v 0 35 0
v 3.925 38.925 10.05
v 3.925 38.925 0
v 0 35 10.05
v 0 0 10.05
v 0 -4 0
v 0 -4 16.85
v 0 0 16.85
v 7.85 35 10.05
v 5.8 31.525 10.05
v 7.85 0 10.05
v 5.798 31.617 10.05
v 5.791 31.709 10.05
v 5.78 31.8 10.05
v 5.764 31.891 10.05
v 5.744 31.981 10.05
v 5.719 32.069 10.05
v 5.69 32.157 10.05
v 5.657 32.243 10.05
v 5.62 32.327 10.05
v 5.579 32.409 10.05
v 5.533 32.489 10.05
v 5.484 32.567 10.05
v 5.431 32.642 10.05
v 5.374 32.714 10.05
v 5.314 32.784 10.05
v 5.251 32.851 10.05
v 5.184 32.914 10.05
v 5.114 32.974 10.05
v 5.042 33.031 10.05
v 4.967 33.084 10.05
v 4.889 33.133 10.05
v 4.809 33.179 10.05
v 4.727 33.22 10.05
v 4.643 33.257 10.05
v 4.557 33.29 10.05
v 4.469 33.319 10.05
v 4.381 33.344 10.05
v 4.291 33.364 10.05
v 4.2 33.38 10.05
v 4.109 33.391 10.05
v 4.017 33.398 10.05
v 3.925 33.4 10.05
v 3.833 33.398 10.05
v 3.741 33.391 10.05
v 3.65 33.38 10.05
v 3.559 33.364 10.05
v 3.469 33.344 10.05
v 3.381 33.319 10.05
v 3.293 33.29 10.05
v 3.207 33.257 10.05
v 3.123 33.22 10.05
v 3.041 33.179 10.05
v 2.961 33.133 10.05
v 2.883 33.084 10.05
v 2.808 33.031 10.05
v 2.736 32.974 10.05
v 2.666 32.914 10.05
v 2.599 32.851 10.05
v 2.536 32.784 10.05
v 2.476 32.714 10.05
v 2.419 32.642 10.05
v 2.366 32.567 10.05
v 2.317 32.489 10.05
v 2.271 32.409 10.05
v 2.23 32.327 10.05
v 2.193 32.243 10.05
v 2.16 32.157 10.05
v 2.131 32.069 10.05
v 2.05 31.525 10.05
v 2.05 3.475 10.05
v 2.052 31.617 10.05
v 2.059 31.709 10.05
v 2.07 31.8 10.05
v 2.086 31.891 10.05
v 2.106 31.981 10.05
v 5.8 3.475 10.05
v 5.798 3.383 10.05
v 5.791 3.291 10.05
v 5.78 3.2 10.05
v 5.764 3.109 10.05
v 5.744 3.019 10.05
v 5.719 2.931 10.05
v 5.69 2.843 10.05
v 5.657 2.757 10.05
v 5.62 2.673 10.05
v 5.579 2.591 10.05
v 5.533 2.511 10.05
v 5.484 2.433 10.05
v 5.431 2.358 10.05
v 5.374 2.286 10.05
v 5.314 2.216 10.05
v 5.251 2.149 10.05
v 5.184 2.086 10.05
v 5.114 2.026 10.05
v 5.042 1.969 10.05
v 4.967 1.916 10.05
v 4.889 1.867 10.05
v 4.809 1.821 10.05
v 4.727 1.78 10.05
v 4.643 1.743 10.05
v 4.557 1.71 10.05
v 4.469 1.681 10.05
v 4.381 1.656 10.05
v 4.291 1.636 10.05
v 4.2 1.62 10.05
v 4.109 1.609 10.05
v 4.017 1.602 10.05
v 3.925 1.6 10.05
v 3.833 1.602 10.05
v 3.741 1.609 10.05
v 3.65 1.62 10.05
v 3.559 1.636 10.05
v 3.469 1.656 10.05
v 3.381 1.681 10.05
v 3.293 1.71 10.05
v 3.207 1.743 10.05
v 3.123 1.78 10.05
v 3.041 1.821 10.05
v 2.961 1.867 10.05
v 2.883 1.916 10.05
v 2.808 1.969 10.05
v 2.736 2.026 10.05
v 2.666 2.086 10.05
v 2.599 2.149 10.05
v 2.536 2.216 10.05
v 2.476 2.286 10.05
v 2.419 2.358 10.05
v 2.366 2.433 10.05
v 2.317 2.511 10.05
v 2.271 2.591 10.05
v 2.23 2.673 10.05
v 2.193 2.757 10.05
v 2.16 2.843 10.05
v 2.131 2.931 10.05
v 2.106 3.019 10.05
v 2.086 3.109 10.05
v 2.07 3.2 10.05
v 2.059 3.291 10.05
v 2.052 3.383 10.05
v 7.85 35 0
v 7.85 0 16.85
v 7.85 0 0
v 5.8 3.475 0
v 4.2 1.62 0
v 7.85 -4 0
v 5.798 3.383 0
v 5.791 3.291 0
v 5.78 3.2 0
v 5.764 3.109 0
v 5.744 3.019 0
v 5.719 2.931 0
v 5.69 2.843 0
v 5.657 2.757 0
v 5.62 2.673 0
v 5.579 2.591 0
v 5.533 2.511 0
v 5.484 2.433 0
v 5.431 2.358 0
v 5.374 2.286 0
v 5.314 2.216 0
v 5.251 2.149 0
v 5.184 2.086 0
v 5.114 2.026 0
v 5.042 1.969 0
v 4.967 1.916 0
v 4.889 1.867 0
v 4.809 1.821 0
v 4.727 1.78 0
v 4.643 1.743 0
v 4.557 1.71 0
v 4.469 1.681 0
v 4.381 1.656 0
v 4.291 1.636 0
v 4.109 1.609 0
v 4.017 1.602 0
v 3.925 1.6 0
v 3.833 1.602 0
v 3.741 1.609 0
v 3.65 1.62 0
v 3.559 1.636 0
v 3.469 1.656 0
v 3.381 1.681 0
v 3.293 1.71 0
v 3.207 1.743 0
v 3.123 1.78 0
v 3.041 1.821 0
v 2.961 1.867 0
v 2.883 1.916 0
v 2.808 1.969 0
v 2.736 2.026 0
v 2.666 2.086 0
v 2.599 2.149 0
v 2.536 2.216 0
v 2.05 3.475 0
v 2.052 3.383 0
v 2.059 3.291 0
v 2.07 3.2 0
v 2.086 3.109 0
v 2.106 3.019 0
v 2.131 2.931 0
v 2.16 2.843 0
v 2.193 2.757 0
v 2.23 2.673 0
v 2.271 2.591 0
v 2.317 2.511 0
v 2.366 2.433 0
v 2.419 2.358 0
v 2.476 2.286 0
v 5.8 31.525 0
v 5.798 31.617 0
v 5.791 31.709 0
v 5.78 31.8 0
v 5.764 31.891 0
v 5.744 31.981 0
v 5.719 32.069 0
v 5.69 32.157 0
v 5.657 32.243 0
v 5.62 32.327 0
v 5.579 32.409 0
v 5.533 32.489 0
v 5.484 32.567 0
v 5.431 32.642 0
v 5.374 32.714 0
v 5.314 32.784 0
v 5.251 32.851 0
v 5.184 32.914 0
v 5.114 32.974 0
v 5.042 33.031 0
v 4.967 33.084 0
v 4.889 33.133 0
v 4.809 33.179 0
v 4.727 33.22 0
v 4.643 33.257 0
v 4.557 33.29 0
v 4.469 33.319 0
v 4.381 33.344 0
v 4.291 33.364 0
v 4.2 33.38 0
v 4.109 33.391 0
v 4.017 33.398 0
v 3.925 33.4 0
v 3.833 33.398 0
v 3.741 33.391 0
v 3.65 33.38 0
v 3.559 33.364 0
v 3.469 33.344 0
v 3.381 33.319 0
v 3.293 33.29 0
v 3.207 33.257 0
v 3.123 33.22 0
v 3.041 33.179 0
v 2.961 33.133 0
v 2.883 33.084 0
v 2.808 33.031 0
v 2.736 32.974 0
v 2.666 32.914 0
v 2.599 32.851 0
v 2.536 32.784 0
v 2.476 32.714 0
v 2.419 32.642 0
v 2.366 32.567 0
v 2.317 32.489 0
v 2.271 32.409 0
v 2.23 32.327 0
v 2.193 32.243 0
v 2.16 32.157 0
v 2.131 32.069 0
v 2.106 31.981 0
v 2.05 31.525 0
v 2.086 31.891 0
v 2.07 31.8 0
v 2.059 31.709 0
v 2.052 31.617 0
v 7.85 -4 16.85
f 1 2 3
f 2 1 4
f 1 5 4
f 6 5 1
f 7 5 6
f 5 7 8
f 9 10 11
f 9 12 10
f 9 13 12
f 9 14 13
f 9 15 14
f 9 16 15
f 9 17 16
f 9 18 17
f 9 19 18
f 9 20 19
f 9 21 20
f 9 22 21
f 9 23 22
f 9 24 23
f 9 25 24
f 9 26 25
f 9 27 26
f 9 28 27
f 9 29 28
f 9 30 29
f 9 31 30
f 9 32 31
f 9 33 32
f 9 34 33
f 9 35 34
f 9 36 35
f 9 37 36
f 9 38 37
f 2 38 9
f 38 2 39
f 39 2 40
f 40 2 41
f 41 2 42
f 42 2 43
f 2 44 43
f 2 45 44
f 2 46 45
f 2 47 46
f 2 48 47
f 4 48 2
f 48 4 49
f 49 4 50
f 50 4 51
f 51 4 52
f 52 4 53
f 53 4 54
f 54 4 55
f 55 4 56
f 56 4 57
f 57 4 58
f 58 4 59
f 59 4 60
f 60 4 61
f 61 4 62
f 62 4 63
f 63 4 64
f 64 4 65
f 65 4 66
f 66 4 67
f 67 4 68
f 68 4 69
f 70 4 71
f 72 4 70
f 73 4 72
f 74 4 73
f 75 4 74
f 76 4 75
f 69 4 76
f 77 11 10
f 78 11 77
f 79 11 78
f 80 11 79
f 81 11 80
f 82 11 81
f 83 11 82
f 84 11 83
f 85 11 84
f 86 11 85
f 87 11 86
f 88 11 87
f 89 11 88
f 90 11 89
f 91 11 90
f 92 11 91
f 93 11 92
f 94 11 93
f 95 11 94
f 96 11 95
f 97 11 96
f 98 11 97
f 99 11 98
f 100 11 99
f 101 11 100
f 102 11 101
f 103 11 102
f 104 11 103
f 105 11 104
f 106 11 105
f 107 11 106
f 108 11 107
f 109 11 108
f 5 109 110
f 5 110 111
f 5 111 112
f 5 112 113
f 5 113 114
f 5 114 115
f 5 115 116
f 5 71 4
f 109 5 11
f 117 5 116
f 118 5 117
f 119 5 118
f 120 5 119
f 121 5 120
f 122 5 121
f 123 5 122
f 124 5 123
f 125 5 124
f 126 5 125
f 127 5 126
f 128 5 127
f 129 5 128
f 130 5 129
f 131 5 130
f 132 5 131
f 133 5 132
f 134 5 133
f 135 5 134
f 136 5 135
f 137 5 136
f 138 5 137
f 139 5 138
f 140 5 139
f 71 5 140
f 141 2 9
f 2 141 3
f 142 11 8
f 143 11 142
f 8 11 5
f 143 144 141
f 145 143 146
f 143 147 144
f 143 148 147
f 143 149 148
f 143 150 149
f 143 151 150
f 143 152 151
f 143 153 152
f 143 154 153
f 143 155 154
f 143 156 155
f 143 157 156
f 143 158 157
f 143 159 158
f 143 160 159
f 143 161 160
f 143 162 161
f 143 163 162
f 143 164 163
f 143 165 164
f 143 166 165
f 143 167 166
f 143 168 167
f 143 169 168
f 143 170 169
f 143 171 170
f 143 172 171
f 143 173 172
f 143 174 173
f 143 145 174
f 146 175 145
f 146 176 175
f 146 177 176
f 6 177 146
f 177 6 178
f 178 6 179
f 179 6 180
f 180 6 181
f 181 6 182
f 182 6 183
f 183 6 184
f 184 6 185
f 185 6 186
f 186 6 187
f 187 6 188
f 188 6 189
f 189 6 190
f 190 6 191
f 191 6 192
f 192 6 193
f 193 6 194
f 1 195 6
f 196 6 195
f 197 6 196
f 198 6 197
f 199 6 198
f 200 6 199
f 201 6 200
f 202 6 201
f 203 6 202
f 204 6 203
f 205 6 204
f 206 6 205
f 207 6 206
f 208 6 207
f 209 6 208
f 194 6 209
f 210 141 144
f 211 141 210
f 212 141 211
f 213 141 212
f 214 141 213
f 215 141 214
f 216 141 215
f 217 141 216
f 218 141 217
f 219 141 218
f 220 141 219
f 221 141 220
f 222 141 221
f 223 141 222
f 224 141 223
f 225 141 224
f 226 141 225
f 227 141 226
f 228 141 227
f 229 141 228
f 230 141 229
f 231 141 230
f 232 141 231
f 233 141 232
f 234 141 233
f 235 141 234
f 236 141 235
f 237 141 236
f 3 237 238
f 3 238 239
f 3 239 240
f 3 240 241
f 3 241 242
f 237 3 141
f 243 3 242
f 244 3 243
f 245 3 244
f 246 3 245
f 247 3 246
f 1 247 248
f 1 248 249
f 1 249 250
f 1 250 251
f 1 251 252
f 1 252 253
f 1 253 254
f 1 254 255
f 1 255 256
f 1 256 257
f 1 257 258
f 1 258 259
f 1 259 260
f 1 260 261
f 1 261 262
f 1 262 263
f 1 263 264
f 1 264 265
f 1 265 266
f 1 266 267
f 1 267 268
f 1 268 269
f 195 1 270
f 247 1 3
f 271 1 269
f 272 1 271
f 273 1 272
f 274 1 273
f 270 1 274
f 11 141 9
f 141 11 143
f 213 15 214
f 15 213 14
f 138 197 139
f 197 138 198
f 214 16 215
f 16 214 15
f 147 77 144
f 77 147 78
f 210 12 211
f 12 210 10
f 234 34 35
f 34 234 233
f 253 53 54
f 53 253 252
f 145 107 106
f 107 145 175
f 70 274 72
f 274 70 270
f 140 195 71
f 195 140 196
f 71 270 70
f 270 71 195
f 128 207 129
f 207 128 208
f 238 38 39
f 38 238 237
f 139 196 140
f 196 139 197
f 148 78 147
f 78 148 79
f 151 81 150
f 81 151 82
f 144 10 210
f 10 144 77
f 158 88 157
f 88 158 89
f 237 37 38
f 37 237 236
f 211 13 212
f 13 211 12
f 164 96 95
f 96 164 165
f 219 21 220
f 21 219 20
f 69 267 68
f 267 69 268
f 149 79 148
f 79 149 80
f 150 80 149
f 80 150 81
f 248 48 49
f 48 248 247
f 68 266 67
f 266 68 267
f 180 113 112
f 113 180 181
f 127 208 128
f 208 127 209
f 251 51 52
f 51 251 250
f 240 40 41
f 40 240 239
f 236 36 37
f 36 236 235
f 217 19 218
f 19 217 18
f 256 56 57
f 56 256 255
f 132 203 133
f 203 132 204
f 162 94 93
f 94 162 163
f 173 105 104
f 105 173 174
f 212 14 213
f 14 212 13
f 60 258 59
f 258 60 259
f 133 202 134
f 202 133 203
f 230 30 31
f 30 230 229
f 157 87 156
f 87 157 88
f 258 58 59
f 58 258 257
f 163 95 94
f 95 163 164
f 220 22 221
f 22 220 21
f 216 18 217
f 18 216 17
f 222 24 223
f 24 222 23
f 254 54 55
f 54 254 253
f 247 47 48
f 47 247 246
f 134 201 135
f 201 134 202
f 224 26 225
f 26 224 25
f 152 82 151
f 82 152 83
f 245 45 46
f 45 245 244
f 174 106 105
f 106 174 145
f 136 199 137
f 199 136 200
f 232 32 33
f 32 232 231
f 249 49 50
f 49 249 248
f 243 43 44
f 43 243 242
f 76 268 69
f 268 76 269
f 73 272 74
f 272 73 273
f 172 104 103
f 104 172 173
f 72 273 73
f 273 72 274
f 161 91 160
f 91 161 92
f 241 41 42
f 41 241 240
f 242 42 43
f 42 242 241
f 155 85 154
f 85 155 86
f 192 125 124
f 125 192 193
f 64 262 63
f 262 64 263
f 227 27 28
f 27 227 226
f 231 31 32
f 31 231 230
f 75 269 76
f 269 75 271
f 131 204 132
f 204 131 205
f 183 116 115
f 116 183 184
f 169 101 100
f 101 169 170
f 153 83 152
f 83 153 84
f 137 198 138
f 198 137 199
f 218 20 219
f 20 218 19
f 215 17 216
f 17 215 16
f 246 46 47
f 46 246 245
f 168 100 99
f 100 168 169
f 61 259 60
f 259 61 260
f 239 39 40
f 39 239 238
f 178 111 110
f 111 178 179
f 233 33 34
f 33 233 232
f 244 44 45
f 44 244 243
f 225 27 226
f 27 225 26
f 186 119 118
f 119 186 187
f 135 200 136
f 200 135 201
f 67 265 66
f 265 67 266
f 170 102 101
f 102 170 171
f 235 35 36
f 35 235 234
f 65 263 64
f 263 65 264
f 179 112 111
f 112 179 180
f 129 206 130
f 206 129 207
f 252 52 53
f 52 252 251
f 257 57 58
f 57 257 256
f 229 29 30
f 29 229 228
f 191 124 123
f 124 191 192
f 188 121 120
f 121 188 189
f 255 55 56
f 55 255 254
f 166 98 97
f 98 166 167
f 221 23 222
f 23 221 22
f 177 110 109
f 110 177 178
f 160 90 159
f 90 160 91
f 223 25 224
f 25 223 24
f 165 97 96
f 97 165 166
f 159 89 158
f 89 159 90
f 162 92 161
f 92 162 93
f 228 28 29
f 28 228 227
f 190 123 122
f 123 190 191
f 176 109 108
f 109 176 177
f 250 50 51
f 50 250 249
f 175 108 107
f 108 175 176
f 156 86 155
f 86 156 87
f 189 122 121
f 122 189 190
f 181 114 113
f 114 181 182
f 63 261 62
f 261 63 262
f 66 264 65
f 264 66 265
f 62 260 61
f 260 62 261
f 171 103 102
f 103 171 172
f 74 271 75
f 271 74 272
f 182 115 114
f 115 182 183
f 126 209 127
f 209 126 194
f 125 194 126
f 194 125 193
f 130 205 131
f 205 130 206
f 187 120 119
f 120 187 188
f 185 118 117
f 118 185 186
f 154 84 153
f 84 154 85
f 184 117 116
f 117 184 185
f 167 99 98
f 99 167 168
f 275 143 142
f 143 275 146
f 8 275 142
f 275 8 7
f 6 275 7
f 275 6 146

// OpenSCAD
// file: Arc_Module_01.scad
/* Explanation of arc() module:
    This module is for creating 2D arcs. 

   arc( a               = angle of arc, 
        r1 or r         = radius 1, 
        r2              = radius 2,
        fragFixed or ff = set a fixed number of fragments in arc
        fragRound or fr = round number of fragments to an integer)

Key Feature:
    Rather than cutting shapes out of a circle, this arc() module 
    creates the arc from scratch by calculates the vectors of each 
    point, this means radius at the open ends of the arc is always 
    true and all the fragments are of equal size.

Parameters:
a: 
    Angle of the arc. Value range = [-360 : 360]
    If undefined the default value = 360 
 
r1 or r: 
    Sets the radius of the arc. 
    If undefined the default value = 0 


r2: 
    Gives the option of a second radius to turn the circle    
    section into a ring section.
    If undefined the default value = 0        

fragFixed or ff: 
    Gives the option of setting a fixed number of fragments in the arc, irrespective of the angle size. 
    fragFixed=0 or fragFixed=undef deactivates this parameter, so undef is the default state.
    If, for some reason, you put both fragFixed and ff in the argument, fragFixed will override ff.

    By default, the number of fragments is set by $fn or $fa, this value will determine the number of fragments in a full circle. The number of fragments in the arc is proportional to the size of its angle, so, an arc of 180° will have half as many fragments as an arc of 360°. This keeps the fragments as close to a constant size as possible.

    If $fn=undef or $fn=0, which it is by default, the number of figments is set by $fa (minimum angle), which has a default value of 12°.  (360°/12° = 30 figments in a circle)

fragRound or fr: 
    The number of fragments has to be an integer, however dividing the angle by $fn will more often than not return a floating-point number which has to be rounded up or down.
    If fragRound=undef  or fragRound="down" or fragRound=0 it will round down (default). Rounding down is the default because this will match segments with rotate_extrude.
    If fragRound="near" or fragRound=1 it will round to the nearest integer.
    If fragRound="up"   or fragRound=2 it will round up.
    If, for some reason, you put both fragRound and fr in the argument, fragRound will override fr.
*/




//>>>>>>>>>>>>> Call arc module <<<<<<<<<<<<< 
//arc(a=270, r1=10, r2=8, fragFixed=undef, fragRound=undef);
arc(a=6, r1=10, r2=8, $fn=6);

//>>>>>>>>>>>> Declair arc module <<<<<<<<<<<< 
module arc(a, r1, r2, fragFixed, fragRound, r, ff, fr){

//variable lable r or r1 bothe acceptable, r1 will overide 
r1 = r1==undef && r==undef   ? undef  :
     r1==undef && is_num(r)  ? r      : r1;

//fragFixed can accept ether lable fragFixed or ff, 
ff = fragFixed!=undef ? fragFixed : (ff !=undef ? ff  : 0);
//disable fragFixed if undef
fragFixed = ff==undef || ff<=0 ? undef : ff;

//fragRound can accept ether lable "fragRound" or "fr"
fragRound = fragRound!=undef ? fragRound : (fr !=undef ? fr  : 0);

//Prevent the arc from intersecting itsef and make negative angle values positive.
angCap  =  (a == undef || a >   360) ? 360  : 
           (a <  0     && a >= -360) ? a*-1 : 
                          a <  -360  ? 360  : a; 
             
//set number of fragments 
frag = min_frag( // if below threshold apply munimum value cap 
fragFixed==undef ? ($fn==undef || $fn==0 ? ((360/($fa==undef ? 90:$fa))/360)*angCap : (($fn/360)*angCap)) : fragFixed);

//Round the number of fragments ether up or down too an intager. min num frag=1
fragNum = fragRound==undef || fragRound=="down" || fragRound==0 ? (floor(frag)<1?1:floor(frag))://round down (defult)
                              fragRound=="near" || fragRound==1 ? (round(frag)<1?1:round(frag))://round  
                              fragRound=="up"   || fragRound==2 ?  ceil (frag)://round up 
                                                                  (floor(frag)<1?1:floor(frag));//round down


//number of vectors
l=len(points(r1));

color("gold")
mirror([0, (a==undef || a>0) ? 1 : 0])//flip arc if angle < 0 
rotate([0,0,-90])
if(((r1==undef || r1<=0) && (r2==undef || r2<=0)) || r1==r2 || angCap==undef || angCap==0 ){
    //The shape has no dimentions so do nothing.
}
else{
    if( r2==undef || r2<=0){
    //Outer radeus defined by r1, No inner radius.
    polygon(concat([for (i=[0:l-1]) points(r1)[i]], [[0,0]]));
}
else{
    if( r1==undef || r1<=0){
    //Outer radeus defined by r2, No inner radius.
    polygon(concat([for (i=[0:l-1]) points(r2)[i]], [[0,0]]));
}
else{
    //Inner and outer radiuses
    polygon([for (i=[0:(l*2)-1]) i<l ? points(r1)[i] : points(r2)[(l*2)-(i+1)]]);
}
}
}


//FUNCTIONS
//calculate the postion of the points.
function points (r) = [ for (a = [0 : angCap/round(fragNum) : angCap]) [ r * sin(a), r * cos(a) ] ];

//set a minimum number of Number_of_fragments to a given angle size.
function min_frag(fragIn)=
(fragIn==undef || fragIn<4) && angCap>=270 ? 3 :
(fragIn==undef || fragIn<3) && angCap>=180 ? 2 : 
(fragIn==undef || fragIn<2) && angCap>= 90 ? 1 : fragIn;
//(fragIn==undef || fragIn<1) && angCap>=  0 ? 1 : fragIn;
}

/* Publication Notes 

arc() Module for OpenSCAD (vertion 01) by SavageRodent
https://www.thingiverse.com/thing:5186085
Last updated: 20/07/2022
Published under: the Creative Commons CC - BY 3.0 licence
Licence details here: https://creativecommons.org/licenses/by/3.0/
*/
// file: constants.scad
$fn= $preview ? 64 : 128;

versionString = "1.1.1";

nozzelDiam = 0.4;
tolerace = 0.25;

thinWall = nozzelDiam * 2;
regWall = nozzelDiam * 3;
heavyWall = nozzelDiam * 4;

barWidth = 7.6; //x
barHeight = 7.8; // z
barLength = 150; // y

tensionScrewOC = 27;
tensionScrewDiam = 4.8 + tolerace;

pivotTopTarget = 29.6;
privotTopActual = 29.5;

underScale = pivotTopTarget/privotTopActual;

pivotTopDiam = pivotTopTarget * underScale + tolerace;
pivotTopRadius = pivotTopDiam / 2;

pivotBottomDiam = 24.5 * underScale + tolerace;
pivotTotalHeight = 10.3 ;
pivotTopHeight = 2.1+ tolerace;
pivotBottomHeight = pivotTotalHeight-pivotTopHeight;

bodyHeight = pivotBottomHeight + pivotTopHeight - tolerace;
bodyRadius = tensionScrewOC + 15 ;
bottomRadius = 50;
totalWidth = bottomRadius * 2;


bladeWidth = barWidth + tolerace;
bladeScrewDia = 3 + tolerace;
bladeBodyLength = 35;
bladeLength= bladeBodyLength + bladeWidth/2;

bladeChannelWidth = bladeScrewDia + 2* tolerace;
bladeChannelLength = bladeBodyLength - heavyWall;
bladeArmWidth = 2.5;
bladeArmLength = bladeBodyLength / 2;
bladeArmDepth = bodyHeight + 3;
bladeTotalWidth = bladeWidth + 2 * bladeArmWidth + tolerace;
halfBladeWidth = bladeWidth / 2;
bladeTailWidth = 4;



headerHeight = 20;

pinRadius = 2;
pinHeight = 3;
pinHoleRadius = pinRadius + tolerace;
pinHoleDepth = pinHeight + tolerace;

pinInset = 15;

apperature = 9.8;

mountOffset = pivotTopRadius + 2;
// main file
include<constants.scad>;
use <Arc_Module_01.scad>;
//include <ScrewsMetric/ScrewsMetric.scad>;

// blade();

 blade(true);
//bar();
// union() {

//main();
// screwHole();

module main() {
    difference() {
        body();
        pivot();
        versionText();
    }
    lettering();
    mountInterface();
}

module mountInterface() {


    inset = (headerHeight + apperature) / 2;
    headerWidth = apperature;
    midPoint = headerHeight / 2;


    translate([-(pivotTopRadius + halfBladeWidth),totalWidth/2,0]) 

    rotate([90,-90,0]) 

    difference() {

        linear_extrude(totalWidth) {
        polygon([
                [0,-halfBladeWidth],
                [0,apperature],
                [inset,apperature],
                [midPoint,apperature/2],
                [headerHeight-inset,apperature],
                [headerHeight,apperature],
                [headerHeight,0]
            ]

        );
        }

        translate([midPoint,apperature/2-pinHoleDepth,0]) 
        rotate([-90,-90,0]) {
                
            translate([pinInset,0,0]) 
            cylinder(h = apperature, r = pinHoleRadius);

            translate([totalWidth - pinInset,0,0]) 
            cylinder(h = apperature, r = pinHoleRadius);

        }
    }

}

module versionText() {
    
    xDelta =  pivotTopRadius + (tensionScrewOC - pivotTopRadius) / 2;
    
    translate([xDelta,0,bodyHeight-0.5]){ 
        rotate(a = 90) 
        linear_extrude(height = 1) {
        text(text=versionString, size = 3, halign = "center");
        }
    }
}

module tensionChannel() {

    innerRad = tensionScrewOC - tensionScrewDiam/2;
    outerRad = innerRad + tensionScrewDiam + thinWall;

    cylRad = tensionScrewDiam/2 + thinWall/2;

    rotate(a = -90) {
        translate([0,0,-0.5]) {
            
            translate([-tensionScrewOC- thinWall/2,0,0]) { 
                cylinder(h=bodyHeight+ 1, r=cylRad, center = false);
            }

            translate([tensionScrewOC + thinWall/2,0,0]) { 
                cylinder(h=bodyHeight+ 1, r=cylRad, center = false);
            }

            linear_extrude(height = bodyHeight + 1)  {
                arc(a=180, r1= innerRad  , r2=outerRad);
            }
        }
    }
}



module body() {

    radius = bodyRadius +  bladeLength/2 - bladeWidth /2  ;

    translate([- (pivotTopRadius + halfBladeWidth), -totalWidth/2 ,0]) 
    cube([pivotTopRadius,totalWidth,bodyHeight]);

    difference() {
        truncatedArc();
        tensionChannel();
        translate([0,0,-1]) {
            resize([0,0,bodyHeight + 2])  {
                for (a =[-6:6]) {
                    orbit(radius, a*15 + 90) {blade();};
                }
            }
        }

    }

}


module truncatedArc (){ 

    color("olive") {
        difference() {


        cylinder(
            h=bodyHeight, 
            r1=bottomRadius,
            r2=bodyRadius, 
            center = false);

        translate([-totalWidth-halfBladeWidth-tolerace,-totalWidth/2,-0.5]) {
            cube([totalWidth, totalWidth, bodyHeight + 1]);
        }

    }
}
}


module lettering() {

    radius = tensionScrewOC + tensionScrewDiam + 3;

    translate([0,0,bodyHeight]){ 

    linear_extrude(height = 1) {
        for (a =[-6:6]) {
            s = str(abs(a * 15));
            orbit(radius, a*15 + 90) {
                text(text=s, size = 3, halign = "center");
            };
        

        }
    }
    }

}
    


module pivot() {
    // translate([0,0,barHeight/2 + 5]) 
    
    color("Gainsboro") { 
    union() {
        translate([0,0,pivotBottomHeight]){
            cylinder(h=pivotTopHeight + tolerace, r=pivotTopDiam / 2, center = false);
        }
        
        translate([0,0,-tolerace]){
            cylinder(h=pivotBottomHeight + tolerace, r=pivotBottomDiam / 2, center = false);
        }
    }
}
}

module blade(includeHole = false) {

    // translate([-bladeWidth/2,-bladeLength/2,0 ]) {

        union() {

            translate([0,-bladeTailWidth,0]) {
                cube([bladeWidth, bladeTailWidth,bodyHeight+barHeight-1]);
            }

            difference() {
                linear_extrude(height = bodyHeight) {
                    polygon(points=[[0,0],[bladeWidth,0],[bladeWidth,bladeBodyLength],[bladeWidth-bladeWidth/2,bladeLength],[0,bladeBodyLength]]);
                }


            if (includeHole) {
                translate(v = [0,0,-0.5]) {
                linear_extrude(height = bodyHeight+1) {
                    hull() {
                    #translate([bladeWidth/2,bladeChannelLength-bladeChannelWidth/2,0]) {
                        // cylinder(h=bodyHeight+1, r=bladeChannelWidth / 2, center = false);
                        circle(d=bladeChannelWidth);
                    }

                    #translate([bladeWidth/2,bladeChannelWidth/2+heavyWall,0]) {
                        // cylinder(h=bodyHeight+1, r=bladeChannelWidth / 2, center = false);
                        circle(d=bladeChannelWidth);
                    } 
                    }
                }
                }
            }
            }
        // }
    }

}

module bar() {

    difference() {
        color("Gainsboro") { 
            cube([barWidth, barLength, barHeight], true);
        }



        translate([0, 27,0]) {
            cylinder(h=barHeight+1, r=tensionScrewDiam / 2, center=true);
        }
    }

}



module orbit(pathRadius = 10, angle=0) {

    a = angle + 180;

    translate(
        [
            pathRadius*sin(-a),
            pathRadius*cos(a),
            0
        ]) {
            rotate(angle)   {
                children();
            }
        }

}

module screwHole() {
    boltCenterHeight = bodyHeight + 1 + getHeadDiameter(allenBolt, M3) / 2;
    translate([-(pivotTopRadius + bladeWidth),0,boltCenterHeight]){
        rotate([0,90,0]) {
            AllenBoltHole(M3, 8, 10 ,0);
        }
    }

}
